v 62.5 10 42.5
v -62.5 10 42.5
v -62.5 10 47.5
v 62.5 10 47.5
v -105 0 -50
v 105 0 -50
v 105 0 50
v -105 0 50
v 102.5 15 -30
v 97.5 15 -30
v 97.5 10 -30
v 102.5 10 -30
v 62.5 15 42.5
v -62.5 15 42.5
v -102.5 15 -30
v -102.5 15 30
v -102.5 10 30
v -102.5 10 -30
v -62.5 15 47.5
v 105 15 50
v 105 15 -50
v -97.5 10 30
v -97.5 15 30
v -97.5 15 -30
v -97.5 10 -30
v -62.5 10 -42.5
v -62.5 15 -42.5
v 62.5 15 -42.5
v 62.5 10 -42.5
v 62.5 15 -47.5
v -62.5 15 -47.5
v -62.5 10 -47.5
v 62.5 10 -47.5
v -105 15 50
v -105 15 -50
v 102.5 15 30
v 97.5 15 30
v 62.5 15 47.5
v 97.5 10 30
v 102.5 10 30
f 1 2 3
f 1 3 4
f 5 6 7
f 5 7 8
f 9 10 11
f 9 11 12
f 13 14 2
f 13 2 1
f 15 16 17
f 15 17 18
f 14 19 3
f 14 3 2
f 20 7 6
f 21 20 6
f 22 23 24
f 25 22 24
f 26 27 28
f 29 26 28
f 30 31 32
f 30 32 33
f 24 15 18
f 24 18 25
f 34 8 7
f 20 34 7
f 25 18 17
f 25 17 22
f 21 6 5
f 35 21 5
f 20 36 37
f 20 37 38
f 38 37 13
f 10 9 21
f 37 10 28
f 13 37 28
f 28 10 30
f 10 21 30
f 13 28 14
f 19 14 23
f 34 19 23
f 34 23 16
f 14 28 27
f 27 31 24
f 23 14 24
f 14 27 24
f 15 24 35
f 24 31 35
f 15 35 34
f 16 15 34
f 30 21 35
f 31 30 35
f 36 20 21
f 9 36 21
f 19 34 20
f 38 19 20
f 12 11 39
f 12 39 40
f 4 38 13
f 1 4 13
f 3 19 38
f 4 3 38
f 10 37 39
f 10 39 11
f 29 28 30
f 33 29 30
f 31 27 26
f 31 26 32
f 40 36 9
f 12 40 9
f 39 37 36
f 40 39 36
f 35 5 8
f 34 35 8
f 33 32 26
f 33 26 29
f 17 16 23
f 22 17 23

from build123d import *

# Parameters (mm, degrees)
BOSS_EXTRUDE1_DEPTH = 15
SKETCH5_W           = 5
SKETCH5_H           = 60
SKETCH5_W_2         = 125
SKETCH5_H_2         = 5
CUT_EXTRUDE2_DEPTH  = 5


with BuildPart() as part:
    # Sketch1 → Boss-Extrude1 (new body)
    with BuildSketch(Plane(origin=(0, 0, 0), x_dir=(1, 0, 0), z_dir=(0, 1, 0))):
        Polygon((-105, 48), (-105, 50), (-103, 50), (103, 50), (105, 50), (105, 48), (105, -48), (105, -50), (103, -50), (-103, -50), (-105, -50), (-105, -48), align=None)
    extrude(amount=BOSS_EXTRUDE1_DEPTH)

    # Sketch5 → Cut-Extrude2 (cut)
    with BuildSketch(Plane(origin=(0, 15, 0), x_dir=(1, 0, 0), z_dir=(0, 1, 0))):
        with Locations((100, 0)):
            Rectangle(SKETCH5_W, SKETCH5_H)
        with Locations((-100, 0)):
            Rectangle(SKETCH5_W, SKETCH5_H)
        with Locations((0, -45)):
            Rectangle(SKETCH5_W_2, SKETCH5_H_2)
        with Locations((0, 45)):
            Rectangle(SKETCH5_W_2, SKETCH5_H_2)
    extrude(amount=-CUT_EXTRUDE2_DEPTH, mode=Mode.SUBTRACT)


solid = part.part
